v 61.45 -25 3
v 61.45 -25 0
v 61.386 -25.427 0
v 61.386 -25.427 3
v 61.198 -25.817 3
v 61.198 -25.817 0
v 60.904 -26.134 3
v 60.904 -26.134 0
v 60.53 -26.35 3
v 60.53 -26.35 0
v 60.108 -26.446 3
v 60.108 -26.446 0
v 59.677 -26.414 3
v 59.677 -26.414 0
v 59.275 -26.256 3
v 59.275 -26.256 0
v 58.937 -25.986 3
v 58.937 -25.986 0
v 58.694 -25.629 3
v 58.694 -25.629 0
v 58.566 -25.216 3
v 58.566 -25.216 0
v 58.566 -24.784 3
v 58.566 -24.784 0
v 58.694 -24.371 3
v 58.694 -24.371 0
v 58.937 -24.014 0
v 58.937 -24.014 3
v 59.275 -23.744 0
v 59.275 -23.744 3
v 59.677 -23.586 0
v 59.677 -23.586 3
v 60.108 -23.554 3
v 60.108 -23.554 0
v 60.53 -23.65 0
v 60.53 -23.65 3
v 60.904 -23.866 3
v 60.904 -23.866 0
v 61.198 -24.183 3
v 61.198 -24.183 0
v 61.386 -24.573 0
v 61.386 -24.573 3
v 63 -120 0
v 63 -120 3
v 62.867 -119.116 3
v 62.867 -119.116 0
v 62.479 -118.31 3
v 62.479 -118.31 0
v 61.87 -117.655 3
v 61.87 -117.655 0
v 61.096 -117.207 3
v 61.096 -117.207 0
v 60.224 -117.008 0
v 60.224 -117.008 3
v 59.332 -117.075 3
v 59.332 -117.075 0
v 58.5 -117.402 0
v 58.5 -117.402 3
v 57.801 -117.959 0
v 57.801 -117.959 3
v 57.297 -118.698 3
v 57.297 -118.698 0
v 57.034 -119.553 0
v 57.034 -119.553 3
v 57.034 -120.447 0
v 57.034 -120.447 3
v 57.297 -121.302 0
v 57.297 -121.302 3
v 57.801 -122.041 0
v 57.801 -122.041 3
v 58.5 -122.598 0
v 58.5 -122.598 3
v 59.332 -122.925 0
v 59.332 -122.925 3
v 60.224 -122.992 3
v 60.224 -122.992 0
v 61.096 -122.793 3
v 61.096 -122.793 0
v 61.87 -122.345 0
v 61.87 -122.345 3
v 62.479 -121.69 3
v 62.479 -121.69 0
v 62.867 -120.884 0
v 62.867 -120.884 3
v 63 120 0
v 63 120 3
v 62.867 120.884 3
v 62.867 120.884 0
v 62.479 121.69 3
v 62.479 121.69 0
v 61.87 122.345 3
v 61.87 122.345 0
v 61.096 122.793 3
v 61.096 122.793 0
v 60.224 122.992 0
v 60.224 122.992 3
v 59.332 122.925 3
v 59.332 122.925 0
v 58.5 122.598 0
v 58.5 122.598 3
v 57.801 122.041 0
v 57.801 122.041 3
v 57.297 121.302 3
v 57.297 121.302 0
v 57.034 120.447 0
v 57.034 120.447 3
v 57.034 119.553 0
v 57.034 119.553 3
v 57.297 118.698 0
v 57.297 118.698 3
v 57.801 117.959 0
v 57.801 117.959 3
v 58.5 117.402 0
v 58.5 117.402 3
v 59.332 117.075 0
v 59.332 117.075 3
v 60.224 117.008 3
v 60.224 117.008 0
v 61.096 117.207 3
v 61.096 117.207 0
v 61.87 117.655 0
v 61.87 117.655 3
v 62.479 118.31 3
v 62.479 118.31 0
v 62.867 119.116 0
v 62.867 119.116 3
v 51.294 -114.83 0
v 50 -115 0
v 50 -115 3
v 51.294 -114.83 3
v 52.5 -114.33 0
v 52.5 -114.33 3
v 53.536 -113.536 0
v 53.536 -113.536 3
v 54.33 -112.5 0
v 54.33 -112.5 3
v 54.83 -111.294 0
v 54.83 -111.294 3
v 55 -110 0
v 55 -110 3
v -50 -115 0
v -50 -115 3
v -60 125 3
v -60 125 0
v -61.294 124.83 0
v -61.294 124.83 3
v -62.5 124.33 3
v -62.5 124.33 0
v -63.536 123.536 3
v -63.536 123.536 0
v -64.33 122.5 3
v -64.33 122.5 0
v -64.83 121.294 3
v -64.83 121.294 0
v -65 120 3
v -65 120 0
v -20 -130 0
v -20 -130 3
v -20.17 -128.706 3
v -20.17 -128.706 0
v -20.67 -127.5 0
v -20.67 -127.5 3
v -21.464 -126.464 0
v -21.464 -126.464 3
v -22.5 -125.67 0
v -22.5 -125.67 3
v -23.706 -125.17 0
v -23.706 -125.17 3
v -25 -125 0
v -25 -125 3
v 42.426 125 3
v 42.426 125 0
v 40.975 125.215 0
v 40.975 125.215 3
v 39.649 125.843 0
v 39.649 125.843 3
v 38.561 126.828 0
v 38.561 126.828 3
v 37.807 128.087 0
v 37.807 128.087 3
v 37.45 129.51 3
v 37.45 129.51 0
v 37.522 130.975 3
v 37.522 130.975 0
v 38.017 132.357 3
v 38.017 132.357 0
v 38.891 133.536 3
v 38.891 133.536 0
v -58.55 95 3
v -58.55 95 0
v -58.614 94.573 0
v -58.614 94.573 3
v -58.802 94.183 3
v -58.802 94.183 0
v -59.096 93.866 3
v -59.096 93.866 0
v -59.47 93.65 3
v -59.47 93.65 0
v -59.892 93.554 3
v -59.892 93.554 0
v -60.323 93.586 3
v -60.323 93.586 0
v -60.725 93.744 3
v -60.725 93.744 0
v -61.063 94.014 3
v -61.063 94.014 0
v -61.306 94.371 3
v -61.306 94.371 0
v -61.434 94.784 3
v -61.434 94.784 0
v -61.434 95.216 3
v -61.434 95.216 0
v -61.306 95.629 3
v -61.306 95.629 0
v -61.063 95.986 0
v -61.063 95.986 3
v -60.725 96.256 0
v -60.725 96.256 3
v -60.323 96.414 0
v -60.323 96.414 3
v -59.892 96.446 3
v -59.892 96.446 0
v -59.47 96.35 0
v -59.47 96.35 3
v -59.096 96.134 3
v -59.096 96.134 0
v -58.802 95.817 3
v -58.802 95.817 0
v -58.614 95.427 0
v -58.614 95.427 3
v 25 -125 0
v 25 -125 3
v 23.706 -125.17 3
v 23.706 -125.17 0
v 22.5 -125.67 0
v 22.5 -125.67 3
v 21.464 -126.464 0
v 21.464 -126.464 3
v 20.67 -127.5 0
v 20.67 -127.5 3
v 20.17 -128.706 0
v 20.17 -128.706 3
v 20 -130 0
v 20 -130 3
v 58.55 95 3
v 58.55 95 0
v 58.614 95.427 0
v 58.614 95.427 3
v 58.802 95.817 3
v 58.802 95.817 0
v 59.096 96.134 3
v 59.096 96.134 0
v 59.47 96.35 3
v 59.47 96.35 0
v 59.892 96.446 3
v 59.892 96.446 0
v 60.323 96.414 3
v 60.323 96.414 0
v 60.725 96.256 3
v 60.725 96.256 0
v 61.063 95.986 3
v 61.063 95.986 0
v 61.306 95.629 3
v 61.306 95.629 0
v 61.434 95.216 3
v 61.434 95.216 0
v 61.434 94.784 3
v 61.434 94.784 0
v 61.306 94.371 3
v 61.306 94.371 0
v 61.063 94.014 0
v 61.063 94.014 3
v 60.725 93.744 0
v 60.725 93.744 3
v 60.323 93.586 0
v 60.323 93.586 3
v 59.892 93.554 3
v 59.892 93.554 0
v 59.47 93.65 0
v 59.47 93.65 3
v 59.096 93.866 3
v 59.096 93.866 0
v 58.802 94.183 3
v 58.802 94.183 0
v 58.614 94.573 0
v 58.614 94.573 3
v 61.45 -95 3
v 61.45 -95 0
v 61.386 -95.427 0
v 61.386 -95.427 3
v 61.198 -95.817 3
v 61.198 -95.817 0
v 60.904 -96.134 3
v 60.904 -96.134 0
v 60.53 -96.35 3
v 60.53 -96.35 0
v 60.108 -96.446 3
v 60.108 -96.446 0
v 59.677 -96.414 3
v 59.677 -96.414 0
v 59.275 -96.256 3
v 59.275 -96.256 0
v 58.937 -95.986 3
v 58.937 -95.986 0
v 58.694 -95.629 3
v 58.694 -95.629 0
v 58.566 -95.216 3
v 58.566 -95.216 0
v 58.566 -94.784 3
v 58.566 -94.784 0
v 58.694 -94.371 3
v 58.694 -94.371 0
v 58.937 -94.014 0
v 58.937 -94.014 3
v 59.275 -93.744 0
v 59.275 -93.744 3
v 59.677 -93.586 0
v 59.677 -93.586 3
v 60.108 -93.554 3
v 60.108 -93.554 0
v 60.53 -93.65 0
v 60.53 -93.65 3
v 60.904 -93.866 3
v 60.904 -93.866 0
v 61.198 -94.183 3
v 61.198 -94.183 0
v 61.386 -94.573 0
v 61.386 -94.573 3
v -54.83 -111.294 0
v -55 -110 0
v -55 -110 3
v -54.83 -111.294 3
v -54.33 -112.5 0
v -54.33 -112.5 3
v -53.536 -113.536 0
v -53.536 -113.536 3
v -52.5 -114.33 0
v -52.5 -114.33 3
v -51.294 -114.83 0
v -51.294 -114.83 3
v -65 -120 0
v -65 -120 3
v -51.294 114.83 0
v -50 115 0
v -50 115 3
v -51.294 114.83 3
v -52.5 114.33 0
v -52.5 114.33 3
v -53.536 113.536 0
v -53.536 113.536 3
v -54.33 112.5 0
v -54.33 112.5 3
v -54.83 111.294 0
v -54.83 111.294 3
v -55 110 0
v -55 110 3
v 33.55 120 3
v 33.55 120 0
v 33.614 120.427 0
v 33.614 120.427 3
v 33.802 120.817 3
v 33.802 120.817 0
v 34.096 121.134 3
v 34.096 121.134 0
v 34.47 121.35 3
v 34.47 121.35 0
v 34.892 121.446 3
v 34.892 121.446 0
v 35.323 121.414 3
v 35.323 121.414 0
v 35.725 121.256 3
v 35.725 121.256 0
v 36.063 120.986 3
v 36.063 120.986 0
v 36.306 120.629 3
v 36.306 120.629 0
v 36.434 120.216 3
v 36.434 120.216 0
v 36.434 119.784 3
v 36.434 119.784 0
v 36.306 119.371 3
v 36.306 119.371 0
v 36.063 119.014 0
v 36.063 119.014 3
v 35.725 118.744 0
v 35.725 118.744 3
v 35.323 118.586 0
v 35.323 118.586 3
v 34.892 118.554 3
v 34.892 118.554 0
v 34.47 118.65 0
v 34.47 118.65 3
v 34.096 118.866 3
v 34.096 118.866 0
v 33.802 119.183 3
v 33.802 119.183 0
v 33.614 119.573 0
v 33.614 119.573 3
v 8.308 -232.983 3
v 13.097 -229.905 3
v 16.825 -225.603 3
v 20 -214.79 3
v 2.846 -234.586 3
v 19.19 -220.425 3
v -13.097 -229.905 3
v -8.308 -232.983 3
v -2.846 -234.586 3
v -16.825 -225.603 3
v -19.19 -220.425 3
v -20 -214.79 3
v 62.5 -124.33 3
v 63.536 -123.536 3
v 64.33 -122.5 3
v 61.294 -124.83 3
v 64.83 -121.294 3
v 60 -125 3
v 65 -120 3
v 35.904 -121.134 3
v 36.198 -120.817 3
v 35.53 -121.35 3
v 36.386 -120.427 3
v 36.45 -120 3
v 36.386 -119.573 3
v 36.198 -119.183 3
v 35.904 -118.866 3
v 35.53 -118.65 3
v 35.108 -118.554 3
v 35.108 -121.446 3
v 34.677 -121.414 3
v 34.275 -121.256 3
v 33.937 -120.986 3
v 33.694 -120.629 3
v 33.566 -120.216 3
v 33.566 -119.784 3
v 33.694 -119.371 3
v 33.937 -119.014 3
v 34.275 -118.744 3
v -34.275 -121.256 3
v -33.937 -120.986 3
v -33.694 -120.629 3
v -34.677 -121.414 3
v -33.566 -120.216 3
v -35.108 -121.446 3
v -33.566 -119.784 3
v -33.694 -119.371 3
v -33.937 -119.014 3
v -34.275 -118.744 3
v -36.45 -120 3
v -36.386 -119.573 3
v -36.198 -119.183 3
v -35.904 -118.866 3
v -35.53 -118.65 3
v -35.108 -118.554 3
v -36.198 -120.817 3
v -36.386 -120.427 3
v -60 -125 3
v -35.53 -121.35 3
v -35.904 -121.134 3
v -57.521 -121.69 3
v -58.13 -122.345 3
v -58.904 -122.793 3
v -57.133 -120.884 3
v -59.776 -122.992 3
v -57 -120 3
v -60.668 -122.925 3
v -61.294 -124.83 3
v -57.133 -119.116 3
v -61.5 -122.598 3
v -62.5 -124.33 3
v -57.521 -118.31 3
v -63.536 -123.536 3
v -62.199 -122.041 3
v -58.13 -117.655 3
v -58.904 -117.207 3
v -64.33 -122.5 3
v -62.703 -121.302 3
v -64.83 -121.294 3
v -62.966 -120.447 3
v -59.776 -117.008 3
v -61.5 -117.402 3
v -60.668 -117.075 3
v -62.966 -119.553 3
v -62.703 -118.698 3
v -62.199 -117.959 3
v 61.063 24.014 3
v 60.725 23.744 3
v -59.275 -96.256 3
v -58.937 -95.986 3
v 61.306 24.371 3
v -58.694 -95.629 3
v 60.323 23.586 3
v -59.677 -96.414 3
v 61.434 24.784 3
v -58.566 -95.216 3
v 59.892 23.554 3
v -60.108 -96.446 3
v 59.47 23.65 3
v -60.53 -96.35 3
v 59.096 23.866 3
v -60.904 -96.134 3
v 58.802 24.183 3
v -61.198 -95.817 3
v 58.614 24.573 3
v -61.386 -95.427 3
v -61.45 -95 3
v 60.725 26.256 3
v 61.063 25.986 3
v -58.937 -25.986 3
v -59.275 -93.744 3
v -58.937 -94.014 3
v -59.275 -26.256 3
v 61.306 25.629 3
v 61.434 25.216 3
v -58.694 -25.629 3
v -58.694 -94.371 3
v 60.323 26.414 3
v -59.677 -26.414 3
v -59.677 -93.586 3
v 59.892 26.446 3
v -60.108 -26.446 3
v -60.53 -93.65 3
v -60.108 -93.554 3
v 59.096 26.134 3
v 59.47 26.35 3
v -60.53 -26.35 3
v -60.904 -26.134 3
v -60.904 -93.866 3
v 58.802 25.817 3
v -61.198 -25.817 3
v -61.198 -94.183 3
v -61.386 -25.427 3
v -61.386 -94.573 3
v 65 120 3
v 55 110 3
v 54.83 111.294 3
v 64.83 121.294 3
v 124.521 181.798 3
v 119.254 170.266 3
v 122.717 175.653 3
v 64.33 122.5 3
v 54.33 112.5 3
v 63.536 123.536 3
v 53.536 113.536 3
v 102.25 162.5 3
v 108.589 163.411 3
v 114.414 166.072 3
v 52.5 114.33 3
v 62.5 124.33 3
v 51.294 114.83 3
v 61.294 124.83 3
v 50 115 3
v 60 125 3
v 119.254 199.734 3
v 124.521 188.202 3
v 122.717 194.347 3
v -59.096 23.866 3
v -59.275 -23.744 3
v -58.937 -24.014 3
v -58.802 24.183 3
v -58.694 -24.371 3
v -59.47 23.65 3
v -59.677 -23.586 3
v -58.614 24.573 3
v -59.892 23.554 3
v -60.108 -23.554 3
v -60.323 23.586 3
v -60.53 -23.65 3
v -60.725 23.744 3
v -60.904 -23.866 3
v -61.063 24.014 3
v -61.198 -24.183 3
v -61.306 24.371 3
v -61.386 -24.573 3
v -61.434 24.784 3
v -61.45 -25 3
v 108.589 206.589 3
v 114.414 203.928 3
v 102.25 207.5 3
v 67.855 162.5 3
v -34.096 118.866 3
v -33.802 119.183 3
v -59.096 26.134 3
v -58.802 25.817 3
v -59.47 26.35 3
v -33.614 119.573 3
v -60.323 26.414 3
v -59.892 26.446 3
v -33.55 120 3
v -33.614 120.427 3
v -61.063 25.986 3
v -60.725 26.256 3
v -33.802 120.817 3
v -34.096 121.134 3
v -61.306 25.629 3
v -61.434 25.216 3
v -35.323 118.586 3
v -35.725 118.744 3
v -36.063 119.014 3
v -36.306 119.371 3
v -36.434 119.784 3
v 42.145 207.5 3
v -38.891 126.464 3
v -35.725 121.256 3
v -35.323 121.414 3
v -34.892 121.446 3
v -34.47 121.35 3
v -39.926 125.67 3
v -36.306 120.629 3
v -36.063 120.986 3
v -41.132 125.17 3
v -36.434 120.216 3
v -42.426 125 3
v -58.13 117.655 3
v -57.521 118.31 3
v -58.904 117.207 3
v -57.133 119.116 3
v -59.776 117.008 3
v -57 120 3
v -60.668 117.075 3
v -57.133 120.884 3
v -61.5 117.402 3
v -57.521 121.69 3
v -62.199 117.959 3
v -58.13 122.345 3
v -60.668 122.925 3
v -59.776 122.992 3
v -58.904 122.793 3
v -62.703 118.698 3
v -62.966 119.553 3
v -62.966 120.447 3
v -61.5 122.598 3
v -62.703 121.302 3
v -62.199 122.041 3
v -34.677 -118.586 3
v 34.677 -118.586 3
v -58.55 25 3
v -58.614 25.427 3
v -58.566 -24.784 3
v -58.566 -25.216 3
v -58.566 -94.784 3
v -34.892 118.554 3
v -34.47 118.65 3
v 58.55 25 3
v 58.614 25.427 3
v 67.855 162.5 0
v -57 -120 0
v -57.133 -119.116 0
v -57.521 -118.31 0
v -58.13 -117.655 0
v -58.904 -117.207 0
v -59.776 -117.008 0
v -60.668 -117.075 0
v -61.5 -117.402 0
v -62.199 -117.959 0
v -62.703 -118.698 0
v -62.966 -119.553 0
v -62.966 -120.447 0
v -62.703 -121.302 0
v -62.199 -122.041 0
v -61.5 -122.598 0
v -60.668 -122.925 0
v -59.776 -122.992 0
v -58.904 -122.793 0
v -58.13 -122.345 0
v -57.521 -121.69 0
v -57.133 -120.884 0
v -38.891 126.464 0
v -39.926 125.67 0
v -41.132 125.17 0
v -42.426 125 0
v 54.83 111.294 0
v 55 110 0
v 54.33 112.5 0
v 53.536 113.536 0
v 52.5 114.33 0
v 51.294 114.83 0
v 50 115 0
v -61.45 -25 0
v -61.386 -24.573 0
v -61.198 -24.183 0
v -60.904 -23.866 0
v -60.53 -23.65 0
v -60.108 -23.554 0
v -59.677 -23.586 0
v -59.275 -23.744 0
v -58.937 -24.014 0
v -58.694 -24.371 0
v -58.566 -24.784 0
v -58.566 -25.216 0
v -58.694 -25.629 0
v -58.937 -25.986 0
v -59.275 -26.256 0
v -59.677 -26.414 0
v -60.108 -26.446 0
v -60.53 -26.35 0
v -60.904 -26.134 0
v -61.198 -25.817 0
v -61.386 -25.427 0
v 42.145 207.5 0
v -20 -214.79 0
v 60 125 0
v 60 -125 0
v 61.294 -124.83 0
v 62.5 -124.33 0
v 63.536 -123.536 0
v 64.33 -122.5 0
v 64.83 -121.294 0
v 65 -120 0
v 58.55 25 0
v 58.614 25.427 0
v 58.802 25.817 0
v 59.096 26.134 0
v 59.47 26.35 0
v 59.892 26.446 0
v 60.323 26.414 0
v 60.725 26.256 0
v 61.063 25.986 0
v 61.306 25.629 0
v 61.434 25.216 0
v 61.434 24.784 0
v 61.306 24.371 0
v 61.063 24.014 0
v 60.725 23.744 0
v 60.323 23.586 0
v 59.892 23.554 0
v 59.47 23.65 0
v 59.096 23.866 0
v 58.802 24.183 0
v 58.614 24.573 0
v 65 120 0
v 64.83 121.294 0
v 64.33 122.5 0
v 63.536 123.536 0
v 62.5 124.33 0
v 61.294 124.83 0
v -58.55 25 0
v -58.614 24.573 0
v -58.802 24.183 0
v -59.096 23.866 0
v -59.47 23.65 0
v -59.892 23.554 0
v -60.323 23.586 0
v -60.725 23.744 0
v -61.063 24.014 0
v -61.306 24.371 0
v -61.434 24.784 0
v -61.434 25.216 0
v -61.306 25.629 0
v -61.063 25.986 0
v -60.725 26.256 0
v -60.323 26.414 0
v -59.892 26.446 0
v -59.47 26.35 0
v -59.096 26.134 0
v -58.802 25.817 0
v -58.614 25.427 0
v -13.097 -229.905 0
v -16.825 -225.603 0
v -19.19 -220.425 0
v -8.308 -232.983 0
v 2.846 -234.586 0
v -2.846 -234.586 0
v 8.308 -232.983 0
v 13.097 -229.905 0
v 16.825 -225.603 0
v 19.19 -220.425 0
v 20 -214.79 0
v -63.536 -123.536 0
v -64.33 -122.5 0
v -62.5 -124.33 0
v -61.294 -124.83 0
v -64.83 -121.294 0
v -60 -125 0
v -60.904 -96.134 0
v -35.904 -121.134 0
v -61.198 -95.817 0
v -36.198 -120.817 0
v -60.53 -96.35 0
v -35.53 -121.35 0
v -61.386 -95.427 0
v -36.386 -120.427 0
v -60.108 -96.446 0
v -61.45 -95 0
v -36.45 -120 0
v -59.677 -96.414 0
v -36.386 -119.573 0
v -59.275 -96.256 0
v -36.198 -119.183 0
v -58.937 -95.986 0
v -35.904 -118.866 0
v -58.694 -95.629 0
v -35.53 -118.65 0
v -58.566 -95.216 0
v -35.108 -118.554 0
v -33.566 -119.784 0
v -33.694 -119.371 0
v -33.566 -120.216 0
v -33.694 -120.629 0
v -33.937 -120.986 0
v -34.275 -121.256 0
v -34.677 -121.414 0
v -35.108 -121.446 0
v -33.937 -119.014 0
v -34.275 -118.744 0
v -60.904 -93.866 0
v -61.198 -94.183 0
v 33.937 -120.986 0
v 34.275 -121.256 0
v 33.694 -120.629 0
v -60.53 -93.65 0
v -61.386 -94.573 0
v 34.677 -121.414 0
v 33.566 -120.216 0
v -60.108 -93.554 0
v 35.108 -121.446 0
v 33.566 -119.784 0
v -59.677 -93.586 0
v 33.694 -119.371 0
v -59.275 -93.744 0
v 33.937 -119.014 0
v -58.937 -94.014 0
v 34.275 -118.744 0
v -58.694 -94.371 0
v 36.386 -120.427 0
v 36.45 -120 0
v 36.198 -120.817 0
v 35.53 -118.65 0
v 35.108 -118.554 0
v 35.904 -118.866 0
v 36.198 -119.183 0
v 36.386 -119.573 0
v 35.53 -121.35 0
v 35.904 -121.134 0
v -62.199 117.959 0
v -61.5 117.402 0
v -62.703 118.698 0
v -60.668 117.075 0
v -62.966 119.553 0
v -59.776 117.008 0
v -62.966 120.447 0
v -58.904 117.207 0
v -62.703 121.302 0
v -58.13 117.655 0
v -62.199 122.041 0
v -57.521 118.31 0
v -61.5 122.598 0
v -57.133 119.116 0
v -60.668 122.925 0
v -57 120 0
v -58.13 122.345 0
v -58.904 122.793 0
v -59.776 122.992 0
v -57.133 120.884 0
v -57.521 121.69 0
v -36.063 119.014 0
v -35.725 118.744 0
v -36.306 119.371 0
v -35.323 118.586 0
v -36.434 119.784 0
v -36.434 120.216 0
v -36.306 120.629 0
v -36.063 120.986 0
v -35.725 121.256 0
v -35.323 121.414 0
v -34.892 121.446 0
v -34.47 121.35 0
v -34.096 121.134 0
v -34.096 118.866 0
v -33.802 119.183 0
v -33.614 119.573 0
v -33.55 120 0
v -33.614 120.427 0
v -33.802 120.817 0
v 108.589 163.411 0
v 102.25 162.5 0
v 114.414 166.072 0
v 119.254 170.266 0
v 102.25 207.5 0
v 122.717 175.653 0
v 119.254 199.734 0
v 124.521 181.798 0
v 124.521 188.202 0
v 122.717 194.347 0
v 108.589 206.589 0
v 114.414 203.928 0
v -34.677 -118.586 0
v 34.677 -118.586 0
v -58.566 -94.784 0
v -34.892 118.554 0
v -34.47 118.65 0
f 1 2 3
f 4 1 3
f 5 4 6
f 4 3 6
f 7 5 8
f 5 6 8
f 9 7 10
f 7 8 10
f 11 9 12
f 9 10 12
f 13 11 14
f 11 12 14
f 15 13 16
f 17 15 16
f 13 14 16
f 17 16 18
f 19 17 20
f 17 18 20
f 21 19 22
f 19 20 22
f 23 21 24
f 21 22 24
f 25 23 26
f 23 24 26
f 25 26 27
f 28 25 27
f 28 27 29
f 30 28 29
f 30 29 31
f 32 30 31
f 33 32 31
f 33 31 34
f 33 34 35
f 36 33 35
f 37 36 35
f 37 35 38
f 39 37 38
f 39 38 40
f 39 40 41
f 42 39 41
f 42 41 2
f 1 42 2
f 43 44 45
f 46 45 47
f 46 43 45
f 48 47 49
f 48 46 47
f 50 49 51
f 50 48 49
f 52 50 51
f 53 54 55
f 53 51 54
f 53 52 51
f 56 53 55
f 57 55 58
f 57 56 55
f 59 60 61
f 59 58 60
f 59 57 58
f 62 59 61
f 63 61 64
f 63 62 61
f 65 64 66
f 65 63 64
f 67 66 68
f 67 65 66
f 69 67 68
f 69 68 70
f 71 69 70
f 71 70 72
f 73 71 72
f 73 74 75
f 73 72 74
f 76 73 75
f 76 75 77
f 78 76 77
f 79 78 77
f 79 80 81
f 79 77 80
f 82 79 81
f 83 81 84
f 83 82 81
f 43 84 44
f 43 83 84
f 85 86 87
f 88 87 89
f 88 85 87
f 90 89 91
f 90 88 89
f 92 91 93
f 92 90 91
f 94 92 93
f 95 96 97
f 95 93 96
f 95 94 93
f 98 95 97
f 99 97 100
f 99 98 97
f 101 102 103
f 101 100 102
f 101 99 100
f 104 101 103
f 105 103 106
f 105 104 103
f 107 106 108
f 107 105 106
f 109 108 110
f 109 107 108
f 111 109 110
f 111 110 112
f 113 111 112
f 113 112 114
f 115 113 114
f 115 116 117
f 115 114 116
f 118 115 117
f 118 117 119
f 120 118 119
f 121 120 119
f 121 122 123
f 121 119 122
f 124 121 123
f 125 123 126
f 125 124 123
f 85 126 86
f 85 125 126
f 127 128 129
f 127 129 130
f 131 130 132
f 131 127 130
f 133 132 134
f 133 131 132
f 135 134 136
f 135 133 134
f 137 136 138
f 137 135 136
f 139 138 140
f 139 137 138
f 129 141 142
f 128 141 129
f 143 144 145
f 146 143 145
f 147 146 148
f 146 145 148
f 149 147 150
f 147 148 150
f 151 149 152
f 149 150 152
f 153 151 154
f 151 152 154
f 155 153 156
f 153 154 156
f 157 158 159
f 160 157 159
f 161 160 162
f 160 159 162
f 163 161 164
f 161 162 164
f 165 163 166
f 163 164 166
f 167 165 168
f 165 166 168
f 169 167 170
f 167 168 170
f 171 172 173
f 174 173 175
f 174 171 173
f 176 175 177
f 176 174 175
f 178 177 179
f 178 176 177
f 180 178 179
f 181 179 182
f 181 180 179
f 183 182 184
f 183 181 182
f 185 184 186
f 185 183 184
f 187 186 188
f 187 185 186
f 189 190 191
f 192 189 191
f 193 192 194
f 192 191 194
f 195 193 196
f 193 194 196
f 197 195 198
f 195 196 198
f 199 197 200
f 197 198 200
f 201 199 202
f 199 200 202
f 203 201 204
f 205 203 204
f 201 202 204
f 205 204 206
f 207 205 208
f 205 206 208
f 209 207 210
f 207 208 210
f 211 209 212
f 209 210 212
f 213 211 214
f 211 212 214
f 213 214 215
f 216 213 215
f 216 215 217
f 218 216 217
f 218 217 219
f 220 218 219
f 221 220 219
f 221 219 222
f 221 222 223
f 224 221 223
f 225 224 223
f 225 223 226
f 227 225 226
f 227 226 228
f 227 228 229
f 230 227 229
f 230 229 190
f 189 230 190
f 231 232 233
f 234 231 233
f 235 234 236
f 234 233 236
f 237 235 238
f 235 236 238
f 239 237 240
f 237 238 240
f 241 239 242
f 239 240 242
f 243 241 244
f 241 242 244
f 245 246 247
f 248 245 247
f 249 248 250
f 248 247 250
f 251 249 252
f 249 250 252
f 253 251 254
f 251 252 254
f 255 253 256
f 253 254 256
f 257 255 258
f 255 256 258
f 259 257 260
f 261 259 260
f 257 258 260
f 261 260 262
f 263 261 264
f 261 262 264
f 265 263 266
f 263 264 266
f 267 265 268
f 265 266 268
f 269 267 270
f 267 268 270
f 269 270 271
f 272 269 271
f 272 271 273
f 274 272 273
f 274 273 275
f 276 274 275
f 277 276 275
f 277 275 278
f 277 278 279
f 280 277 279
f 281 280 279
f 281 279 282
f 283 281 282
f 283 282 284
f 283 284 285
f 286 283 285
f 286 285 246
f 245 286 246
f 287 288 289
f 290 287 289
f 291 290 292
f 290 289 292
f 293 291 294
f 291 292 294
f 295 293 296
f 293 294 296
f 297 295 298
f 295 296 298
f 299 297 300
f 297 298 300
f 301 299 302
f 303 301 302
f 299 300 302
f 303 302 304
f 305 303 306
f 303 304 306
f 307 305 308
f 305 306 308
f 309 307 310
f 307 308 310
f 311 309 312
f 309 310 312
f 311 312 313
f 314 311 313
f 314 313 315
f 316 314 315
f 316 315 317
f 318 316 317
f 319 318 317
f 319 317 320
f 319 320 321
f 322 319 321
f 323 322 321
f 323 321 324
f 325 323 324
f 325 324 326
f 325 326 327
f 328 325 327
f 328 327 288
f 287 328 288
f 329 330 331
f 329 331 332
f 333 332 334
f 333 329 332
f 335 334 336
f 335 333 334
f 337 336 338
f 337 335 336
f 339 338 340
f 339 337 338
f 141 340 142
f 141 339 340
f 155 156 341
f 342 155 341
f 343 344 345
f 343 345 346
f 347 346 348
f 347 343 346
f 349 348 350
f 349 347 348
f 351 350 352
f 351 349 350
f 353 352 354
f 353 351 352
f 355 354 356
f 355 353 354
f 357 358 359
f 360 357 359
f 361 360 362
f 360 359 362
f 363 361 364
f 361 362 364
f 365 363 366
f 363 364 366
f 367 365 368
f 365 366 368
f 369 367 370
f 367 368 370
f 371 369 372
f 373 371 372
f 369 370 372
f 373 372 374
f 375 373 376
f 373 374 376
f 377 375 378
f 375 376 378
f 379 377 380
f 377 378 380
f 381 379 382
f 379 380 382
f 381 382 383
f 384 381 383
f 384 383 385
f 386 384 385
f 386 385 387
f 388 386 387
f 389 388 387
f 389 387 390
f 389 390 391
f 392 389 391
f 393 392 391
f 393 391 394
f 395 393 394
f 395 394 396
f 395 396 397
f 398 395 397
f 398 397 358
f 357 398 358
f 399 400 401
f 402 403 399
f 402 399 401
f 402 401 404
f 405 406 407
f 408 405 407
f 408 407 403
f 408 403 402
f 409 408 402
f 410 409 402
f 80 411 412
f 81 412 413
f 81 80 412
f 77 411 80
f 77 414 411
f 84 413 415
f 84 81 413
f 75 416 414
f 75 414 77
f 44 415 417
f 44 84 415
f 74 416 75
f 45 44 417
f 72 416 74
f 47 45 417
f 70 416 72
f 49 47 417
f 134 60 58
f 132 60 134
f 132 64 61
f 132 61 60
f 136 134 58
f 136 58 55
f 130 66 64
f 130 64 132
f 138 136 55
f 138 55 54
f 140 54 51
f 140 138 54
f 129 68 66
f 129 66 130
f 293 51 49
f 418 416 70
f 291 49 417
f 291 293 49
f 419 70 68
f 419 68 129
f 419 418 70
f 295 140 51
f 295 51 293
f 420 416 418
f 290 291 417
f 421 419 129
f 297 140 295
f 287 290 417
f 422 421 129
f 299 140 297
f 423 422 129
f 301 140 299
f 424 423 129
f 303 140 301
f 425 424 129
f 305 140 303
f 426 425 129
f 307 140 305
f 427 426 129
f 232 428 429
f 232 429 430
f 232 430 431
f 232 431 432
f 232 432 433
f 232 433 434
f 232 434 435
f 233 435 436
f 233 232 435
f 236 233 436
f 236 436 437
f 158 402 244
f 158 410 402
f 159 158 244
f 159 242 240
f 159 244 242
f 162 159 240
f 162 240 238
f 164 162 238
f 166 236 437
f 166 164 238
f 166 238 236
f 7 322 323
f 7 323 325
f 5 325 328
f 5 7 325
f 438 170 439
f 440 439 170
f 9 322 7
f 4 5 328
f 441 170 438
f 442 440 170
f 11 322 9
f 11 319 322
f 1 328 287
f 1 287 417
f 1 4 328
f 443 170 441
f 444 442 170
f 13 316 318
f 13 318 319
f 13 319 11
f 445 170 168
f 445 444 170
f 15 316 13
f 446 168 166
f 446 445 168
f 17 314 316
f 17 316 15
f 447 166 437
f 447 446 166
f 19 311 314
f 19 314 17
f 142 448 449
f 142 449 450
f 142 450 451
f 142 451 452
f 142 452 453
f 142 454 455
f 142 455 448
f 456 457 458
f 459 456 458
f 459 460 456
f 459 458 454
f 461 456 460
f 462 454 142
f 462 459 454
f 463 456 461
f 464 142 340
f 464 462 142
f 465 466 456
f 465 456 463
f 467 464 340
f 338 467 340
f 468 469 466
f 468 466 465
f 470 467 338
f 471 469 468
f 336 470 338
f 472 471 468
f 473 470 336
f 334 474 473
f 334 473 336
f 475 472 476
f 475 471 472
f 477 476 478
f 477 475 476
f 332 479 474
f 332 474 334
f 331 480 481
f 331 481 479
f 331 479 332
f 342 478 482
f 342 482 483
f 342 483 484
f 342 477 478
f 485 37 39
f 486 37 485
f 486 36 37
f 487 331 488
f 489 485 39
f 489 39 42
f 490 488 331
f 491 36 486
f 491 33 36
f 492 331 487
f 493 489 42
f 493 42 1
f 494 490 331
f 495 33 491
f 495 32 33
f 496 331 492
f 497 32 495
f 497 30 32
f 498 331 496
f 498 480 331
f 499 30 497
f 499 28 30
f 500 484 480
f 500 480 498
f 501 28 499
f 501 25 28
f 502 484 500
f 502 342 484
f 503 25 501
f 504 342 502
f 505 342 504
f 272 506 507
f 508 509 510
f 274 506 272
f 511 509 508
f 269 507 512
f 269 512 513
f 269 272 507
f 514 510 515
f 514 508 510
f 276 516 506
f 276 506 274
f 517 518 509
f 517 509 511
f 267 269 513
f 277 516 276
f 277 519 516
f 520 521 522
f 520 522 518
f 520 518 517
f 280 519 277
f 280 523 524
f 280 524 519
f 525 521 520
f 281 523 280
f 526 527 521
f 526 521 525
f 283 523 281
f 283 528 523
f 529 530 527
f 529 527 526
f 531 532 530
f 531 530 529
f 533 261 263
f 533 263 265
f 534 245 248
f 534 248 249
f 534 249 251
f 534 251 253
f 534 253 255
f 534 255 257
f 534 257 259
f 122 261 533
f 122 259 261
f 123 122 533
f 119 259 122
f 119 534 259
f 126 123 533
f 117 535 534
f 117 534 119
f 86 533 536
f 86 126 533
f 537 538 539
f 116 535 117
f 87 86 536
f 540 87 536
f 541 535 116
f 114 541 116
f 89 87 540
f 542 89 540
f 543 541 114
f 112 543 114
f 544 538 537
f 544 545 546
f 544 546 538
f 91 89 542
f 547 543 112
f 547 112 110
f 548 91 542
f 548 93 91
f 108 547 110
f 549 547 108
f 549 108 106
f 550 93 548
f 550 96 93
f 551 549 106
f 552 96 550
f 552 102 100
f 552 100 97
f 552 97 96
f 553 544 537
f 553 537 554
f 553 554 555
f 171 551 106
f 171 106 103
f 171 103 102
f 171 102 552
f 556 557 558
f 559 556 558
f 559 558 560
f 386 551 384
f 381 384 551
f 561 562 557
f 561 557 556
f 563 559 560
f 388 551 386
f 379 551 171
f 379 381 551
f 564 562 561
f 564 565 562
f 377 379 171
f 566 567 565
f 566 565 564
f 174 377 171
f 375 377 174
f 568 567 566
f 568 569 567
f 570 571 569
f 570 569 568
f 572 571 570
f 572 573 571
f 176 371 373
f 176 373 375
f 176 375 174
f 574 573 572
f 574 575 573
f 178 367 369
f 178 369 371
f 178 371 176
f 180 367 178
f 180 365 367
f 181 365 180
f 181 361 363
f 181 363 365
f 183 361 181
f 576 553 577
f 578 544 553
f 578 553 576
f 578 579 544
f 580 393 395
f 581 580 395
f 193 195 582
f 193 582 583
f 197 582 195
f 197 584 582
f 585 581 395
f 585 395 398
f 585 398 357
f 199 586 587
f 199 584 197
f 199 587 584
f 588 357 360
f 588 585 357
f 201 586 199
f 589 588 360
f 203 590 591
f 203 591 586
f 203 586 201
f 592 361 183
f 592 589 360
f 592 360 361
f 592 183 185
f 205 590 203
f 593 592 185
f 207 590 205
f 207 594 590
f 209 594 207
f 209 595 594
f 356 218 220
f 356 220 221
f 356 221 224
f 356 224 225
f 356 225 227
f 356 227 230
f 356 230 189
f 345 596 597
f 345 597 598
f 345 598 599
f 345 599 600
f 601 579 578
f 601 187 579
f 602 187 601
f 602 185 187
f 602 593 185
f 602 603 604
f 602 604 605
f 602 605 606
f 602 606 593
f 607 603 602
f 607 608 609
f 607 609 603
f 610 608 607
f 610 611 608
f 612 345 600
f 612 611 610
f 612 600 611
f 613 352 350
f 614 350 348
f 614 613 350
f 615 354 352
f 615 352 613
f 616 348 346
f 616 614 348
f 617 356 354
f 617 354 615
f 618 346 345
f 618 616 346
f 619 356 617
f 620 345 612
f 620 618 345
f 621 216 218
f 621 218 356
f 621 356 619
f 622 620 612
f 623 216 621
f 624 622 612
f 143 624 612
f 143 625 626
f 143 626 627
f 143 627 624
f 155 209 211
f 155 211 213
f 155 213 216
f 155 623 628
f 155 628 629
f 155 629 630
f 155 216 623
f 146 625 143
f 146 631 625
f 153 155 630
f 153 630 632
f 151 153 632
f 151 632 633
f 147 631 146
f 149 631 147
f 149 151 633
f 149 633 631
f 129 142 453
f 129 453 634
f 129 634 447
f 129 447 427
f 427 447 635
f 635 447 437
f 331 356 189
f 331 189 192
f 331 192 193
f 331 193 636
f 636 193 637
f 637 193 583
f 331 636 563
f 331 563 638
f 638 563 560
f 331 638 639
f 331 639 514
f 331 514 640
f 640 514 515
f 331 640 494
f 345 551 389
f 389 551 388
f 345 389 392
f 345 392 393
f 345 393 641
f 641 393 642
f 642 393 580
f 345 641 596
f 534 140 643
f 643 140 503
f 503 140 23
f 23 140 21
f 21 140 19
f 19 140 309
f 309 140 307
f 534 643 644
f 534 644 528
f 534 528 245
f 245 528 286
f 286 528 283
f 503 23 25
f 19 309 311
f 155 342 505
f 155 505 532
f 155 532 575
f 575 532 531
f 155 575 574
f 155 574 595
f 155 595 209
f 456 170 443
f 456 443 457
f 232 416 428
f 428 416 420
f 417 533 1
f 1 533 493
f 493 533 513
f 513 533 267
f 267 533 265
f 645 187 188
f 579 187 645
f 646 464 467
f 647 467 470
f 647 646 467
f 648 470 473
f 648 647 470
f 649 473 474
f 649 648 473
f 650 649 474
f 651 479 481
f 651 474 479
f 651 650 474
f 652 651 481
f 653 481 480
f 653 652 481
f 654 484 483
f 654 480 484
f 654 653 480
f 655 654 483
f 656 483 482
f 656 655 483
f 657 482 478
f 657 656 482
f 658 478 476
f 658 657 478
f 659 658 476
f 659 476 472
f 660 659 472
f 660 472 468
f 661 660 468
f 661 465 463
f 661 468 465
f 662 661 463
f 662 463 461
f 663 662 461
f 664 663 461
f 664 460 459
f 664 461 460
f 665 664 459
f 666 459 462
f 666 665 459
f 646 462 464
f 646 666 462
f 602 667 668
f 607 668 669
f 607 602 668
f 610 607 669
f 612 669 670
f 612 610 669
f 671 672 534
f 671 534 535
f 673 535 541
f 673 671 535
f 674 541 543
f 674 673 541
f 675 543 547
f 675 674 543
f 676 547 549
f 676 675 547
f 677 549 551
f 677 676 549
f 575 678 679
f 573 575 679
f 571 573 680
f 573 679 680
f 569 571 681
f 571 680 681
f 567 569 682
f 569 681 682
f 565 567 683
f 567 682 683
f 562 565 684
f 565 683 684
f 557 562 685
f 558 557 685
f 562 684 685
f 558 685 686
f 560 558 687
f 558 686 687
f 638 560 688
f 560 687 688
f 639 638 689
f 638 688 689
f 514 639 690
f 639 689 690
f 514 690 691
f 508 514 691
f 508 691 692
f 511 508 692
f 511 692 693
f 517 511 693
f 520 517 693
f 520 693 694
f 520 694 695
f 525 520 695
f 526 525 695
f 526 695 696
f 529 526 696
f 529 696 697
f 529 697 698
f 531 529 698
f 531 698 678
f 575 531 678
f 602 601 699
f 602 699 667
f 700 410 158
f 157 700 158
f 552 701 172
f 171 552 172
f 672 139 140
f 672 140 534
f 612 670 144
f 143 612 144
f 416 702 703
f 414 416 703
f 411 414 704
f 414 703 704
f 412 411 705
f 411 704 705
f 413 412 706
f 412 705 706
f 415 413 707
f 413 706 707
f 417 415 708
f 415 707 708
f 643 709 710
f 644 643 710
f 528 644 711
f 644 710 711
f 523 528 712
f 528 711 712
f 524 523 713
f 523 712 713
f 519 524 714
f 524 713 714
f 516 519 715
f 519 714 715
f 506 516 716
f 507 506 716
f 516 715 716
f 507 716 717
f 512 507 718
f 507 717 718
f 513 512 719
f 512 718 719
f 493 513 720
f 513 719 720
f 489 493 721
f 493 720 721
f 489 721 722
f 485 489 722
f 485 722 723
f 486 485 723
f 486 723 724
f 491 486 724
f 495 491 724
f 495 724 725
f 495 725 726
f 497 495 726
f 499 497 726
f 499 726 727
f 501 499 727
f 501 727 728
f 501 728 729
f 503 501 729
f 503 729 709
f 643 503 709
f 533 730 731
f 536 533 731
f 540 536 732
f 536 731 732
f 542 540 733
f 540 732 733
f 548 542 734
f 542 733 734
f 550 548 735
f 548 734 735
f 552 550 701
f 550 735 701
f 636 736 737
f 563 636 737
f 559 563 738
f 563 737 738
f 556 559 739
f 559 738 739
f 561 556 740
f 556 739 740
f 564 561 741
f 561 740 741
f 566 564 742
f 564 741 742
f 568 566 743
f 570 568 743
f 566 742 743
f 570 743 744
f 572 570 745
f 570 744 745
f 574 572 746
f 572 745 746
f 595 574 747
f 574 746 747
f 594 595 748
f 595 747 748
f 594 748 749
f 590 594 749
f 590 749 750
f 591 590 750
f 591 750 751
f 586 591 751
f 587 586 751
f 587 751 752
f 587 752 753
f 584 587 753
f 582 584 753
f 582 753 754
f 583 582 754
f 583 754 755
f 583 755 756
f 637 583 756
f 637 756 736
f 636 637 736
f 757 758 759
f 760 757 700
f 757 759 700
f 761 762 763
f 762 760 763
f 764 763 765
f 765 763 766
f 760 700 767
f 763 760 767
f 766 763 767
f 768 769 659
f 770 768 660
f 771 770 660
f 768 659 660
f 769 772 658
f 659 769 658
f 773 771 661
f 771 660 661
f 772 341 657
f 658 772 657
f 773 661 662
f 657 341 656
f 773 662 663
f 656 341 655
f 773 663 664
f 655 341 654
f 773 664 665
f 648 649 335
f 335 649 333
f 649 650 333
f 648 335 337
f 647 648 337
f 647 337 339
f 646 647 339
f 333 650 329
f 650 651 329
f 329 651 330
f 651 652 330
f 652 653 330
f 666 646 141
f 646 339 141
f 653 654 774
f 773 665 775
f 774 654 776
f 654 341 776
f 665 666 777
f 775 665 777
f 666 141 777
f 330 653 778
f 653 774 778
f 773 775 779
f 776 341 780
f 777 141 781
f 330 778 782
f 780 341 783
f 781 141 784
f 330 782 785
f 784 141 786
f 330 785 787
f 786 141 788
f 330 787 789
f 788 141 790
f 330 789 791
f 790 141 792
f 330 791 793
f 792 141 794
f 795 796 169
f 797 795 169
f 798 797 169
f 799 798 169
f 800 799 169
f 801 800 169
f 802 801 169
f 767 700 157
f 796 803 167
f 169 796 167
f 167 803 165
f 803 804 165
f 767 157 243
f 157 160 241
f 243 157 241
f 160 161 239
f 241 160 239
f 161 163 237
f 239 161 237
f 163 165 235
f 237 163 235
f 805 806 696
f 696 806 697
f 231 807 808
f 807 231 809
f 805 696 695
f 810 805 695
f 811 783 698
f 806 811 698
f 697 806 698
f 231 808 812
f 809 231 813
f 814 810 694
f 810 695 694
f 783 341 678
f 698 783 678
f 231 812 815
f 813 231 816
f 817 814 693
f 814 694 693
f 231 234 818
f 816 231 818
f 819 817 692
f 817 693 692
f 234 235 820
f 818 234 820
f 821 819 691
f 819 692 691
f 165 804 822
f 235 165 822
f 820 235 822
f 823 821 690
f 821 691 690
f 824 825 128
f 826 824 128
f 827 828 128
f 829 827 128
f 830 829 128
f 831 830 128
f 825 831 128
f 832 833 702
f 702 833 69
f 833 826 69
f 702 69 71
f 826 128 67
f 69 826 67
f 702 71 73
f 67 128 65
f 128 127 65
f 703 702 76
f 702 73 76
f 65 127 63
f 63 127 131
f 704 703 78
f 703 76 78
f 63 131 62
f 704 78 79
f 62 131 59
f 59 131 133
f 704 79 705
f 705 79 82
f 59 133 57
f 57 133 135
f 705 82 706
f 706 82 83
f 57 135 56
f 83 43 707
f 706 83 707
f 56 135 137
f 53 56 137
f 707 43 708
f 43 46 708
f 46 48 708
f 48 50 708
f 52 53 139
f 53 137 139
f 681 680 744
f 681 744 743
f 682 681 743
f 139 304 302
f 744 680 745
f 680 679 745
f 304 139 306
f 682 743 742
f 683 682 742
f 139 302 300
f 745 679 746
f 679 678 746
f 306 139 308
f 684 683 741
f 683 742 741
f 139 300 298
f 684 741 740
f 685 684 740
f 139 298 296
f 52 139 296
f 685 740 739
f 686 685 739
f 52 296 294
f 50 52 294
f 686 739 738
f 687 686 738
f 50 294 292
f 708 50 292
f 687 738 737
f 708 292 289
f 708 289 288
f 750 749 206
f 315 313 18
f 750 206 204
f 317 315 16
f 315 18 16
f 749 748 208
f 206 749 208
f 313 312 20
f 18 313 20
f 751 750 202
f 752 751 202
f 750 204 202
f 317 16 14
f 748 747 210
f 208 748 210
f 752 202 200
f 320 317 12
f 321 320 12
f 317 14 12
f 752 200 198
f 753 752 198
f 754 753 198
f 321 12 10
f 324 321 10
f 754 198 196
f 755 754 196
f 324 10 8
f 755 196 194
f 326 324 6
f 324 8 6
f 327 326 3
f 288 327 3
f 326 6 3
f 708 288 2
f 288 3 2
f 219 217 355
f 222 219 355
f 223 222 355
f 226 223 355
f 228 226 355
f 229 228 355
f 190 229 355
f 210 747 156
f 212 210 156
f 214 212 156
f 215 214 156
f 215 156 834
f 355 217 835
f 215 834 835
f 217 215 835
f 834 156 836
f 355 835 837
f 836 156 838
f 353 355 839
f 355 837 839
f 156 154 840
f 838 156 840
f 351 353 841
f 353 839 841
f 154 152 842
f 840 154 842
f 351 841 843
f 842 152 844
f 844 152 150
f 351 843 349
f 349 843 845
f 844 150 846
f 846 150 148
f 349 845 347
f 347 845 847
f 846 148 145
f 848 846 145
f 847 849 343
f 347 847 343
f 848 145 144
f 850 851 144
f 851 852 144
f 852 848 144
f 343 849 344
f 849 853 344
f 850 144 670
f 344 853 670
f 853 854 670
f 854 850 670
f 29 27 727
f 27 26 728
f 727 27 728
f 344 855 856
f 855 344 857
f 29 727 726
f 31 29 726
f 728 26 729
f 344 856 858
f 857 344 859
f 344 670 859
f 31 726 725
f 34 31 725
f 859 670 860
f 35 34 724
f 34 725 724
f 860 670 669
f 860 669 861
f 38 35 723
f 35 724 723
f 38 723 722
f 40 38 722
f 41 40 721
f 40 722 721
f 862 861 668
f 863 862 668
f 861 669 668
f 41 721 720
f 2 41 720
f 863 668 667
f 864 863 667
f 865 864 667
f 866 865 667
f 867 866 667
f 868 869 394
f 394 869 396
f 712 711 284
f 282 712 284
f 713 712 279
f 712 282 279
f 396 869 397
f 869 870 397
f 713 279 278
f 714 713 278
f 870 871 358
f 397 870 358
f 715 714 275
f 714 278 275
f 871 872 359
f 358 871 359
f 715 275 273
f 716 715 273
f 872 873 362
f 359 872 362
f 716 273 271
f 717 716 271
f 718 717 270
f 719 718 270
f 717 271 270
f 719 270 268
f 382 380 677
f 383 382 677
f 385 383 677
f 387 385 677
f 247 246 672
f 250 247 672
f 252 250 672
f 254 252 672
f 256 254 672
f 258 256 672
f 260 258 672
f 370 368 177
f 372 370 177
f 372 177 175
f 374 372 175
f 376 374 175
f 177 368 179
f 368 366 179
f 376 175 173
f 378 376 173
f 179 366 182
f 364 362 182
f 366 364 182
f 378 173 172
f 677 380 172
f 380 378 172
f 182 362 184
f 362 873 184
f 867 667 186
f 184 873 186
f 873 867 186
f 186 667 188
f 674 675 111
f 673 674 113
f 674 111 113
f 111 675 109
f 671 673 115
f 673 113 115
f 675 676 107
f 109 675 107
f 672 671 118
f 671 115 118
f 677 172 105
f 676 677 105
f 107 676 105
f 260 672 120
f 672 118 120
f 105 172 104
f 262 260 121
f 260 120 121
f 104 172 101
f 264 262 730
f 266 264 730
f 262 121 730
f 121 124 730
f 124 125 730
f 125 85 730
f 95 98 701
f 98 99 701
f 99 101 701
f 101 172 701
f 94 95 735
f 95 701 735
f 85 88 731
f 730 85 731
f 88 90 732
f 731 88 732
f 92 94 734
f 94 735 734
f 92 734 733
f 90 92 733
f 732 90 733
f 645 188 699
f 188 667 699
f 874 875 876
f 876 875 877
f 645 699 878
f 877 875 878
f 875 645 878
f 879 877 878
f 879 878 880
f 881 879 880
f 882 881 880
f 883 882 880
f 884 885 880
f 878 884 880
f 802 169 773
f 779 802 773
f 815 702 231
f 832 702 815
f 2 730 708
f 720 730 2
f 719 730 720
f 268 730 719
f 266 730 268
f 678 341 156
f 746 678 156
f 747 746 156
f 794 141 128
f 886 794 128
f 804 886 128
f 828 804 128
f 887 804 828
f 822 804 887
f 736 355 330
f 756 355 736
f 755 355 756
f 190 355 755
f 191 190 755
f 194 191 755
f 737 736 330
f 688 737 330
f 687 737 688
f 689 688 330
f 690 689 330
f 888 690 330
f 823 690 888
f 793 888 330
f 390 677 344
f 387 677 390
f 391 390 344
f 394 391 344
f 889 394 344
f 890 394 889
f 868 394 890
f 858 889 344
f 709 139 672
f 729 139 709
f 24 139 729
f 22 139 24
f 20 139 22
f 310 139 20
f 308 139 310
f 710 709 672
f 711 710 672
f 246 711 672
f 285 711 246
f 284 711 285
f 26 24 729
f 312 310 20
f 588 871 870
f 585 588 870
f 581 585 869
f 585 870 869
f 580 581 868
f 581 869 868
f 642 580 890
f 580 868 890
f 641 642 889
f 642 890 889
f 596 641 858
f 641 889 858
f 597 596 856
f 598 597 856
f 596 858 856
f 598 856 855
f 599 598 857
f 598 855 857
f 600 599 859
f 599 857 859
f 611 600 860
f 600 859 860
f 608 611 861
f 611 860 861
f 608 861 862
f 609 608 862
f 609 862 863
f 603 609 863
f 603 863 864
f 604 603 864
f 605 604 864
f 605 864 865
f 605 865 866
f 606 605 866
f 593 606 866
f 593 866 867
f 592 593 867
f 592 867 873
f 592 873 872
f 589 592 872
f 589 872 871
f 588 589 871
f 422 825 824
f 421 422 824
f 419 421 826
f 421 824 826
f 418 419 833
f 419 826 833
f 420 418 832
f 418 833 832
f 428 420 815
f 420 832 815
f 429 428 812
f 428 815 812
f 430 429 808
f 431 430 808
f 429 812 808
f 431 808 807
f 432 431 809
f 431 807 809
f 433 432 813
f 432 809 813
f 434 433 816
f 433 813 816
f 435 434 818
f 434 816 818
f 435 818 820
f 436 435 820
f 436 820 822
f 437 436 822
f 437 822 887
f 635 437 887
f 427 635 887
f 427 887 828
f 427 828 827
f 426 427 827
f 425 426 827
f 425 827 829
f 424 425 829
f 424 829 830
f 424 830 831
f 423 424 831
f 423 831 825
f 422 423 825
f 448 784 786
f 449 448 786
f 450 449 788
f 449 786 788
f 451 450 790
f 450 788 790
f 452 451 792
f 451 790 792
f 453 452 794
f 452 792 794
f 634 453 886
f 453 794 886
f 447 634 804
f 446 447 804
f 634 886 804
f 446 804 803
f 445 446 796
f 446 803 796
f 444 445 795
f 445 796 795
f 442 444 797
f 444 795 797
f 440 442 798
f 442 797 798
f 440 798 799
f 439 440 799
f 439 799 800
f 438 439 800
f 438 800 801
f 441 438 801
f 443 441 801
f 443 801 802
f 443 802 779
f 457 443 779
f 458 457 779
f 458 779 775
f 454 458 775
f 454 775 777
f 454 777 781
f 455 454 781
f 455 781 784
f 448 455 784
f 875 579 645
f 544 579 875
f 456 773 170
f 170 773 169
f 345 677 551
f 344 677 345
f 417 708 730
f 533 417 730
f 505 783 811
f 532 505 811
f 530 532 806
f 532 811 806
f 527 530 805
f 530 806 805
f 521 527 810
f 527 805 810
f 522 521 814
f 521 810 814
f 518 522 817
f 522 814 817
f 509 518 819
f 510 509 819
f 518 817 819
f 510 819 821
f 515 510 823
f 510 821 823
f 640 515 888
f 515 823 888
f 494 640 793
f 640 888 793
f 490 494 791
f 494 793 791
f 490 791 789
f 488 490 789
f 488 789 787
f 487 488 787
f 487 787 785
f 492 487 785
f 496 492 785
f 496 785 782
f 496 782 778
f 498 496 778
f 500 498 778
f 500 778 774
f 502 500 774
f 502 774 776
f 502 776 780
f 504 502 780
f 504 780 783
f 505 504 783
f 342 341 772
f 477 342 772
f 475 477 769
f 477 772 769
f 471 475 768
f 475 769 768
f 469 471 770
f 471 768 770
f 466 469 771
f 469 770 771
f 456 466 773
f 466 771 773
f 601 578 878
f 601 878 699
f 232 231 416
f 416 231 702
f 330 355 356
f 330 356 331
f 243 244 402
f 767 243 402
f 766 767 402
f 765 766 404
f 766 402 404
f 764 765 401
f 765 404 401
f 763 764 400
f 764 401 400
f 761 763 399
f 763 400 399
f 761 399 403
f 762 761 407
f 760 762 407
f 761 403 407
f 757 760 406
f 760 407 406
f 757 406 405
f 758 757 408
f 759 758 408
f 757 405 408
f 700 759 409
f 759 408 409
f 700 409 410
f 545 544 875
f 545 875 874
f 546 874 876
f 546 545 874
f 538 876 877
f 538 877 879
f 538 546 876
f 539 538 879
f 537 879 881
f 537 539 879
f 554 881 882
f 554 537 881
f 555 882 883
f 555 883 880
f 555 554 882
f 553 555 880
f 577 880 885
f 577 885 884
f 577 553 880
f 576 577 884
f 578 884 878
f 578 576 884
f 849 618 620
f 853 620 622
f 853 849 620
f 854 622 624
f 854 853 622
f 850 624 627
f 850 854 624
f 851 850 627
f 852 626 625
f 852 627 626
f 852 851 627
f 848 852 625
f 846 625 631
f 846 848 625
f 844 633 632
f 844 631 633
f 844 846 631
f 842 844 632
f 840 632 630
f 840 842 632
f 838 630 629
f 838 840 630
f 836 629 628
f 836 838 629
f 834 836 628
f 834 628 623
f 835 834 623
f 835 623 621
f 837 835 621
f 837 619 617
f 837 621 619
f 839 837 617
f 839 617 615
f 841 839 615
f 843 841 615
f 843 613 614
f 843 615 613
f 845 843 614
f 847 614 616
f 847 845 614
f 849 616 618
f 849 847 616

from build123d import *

# Parameters (mm, degrees)
SKETCH1_R           = 3
BOSS_EXTRUDE1_DEPTH = 10
SKETCH2_R           = 1.45
CUT_EXTRUDE1_DEPTH  = 142.244468918
BOSS_EXTRUDE2_DEPTH = 10
BOSS_EXTRUDE3_DEPTH = 10
SKETCH8_W           = 62.731065403
SKETCH8_H           = 467.056503757
CUT_EXTRUDE5_DEPTH  = 303.045371757


with BuildPart() as part:
    # Sketch1 → Boss-Extrude1 (new body)
    with BuildSketch(Plane.XY):
        with BuildLine():
            Line((-60, -125), (60, -125))
            ThreePointArc((60, -125), (63.535533906, -123.535533906), (65, -120))
            Line((65, -120), (65, 120))
            ThreePointArc((65, 120), (63.535533906, 123.535533906), (60, 125))
            Line((60, 125), (-60, 125))
            ThreePointArc((-60, 125), (-63.535533906, 123.535533906), (-65, 120))
            Line((-65, 120), (-65, -120))
            ThreePointArc((-65, -120), (-63.535533906, -123.535533906), (-60, -125))
        make_face()
        with Locations((-60, 120)):
            Circle(SKETCH1_R, mode=Mode.SUBTRACT)
        with Locations((60, 120)):
            Circle(SKETCH1_R, mode=Mode.SUBTRACT)
        with Locations((-60, -120)):
            Circle(SKETCH1_R, mode=Mode.SUBTRACT)
        with Locations((60, -120)):
            Circle(SKETCH1_R, mode=Mode.SUBTRACT)
        with BuildLine():
            Line((-50, -115), (50, -115))
            ThreePointArc((50, -115), (53.535533906, -113.535533906), (55, -110))
            Line((55, -110), (55, 110))
            ThreePointArc((55, 110), (53.535533906, 113.535533906), (50, 115))
            Line((50, 115), (-50, 115))
            ThreePointArc((-50, 115), (-53.535533906, 113.535533906), (-55, 110))
            Line((-55, 110), (-55, -110))
            ThreePointArc((-55, -110), (-53.535533906, -113.535533906), (-50, -115))
        make_face(mode=Mode.SUBTRACT)
    extrude(amount=BOSS_EXTRUDE1_DEPTH)

    # Sketch2 → Cut-Extrude1 (cut, through all)
    with BuildSketch(Plane(origin=(0, 0, 0), x_dir=(-1, 0, 0), z_dir=(0, 0, -1))):
        with Locations((-35, 120)):
            Circle(SKETCH2_R)
        with Locations((-60, 95)):
            Circle(SKETCH2_R)
        with Locations((-60, 25)):
            Circle(SKETCH2_R)
        with Locations(Location((-60, -25, 0), (0, 0, 180))):
            Circle(SKETCH2_R)
        with Locations(Location((-60, -95, 0), (0, 0, 180))):
            Circle(SKETCH2_R)
        with Locations(Location((-35, -120, 0), (0, 0, 180))):
            Circle(SKETCH2_R)
        with Locations((35, -120)):
            Circle(SKETCH2_R)
        with Locations((60, -95)):
            Circle(SKETCH2_R)
        with Locations((60, -25)):
            Circle(SKETCH2_R)
        with Locations(Location((60, 25, 0), (0, 0, 180))):
            Circle(SKETCH2_R)
        with Locations(Location((60, 95, 0), (0, 0, 180))):
            Circle(SKETCH2_R)
        with Locations(Location((35, 120, 0), (0, 0, 180))):
            Circle(SKETCH2_R)
    extrude(amount=-CUT_EXTRUDE1_DEPTH, mode=Mode.SUBTRACT)

    # Sketch3 → Boss-Extrude2 (add, through all)
    with BuildSketch(Plane.XY.offset(10)):
        with BuildLine():
            Line((-20, -214.79), (-20, -130))
            ThreePointArc((-20, -130), (-21.464466094, -126.464466094), (-25, -125))
            Line((-25, -125), (25, -125))
            ThreePointArc((25, -125), (21.464466094, -126.464466094), (20, -130))
            Line((20, -130), (20, -214.79))
            ThreePointArc((20, -214.79), (0, -234.79), (-20, -214.79))
        make_face()
    extrude(amount=-BOSS_EXTRUDE2_DEPTH)

    # Sketch5 → Boss-Extrude3 (add)
    with BuildSketch(Plane.XY.offset(10)):
        with BuildLine():
            ThreePointArc((-38.890872965, 126.464466094), (-40.512989709, 125.380602337), (-42.426406871, 125))
            Line((-42.426406871, 125), (42.426406871, 125))
            ThreePointArc((42.426406871, 125), (37.807009209, 128.086582838), (38.890872965, 133.535533906))
            Line((38.890872965, 133.535533906), (67.855339059, 162.5))
            Line((67.855339059, 162.5), (102.25, 162.5))
            ThreePointArc((102.25, 162.5), (124.75, 185), (102.25, 207.5))
            Line((102.25, 207.5), (42.144660941, 207.5))
            Line((42.144660941, 207.5), (-38.890872965, 126.464466094))
        make_face()
    extrude(amount=-BOSS_EXTRUDE3_DEPTH)

    # Sketch8 → Cut-Extrude5 (cut, through all)
    with BuildSketch(Plane.ZY.offset(65)):
        with Locations((34.365532702, -16.017183146)):
            Rectangle(SKETCH8_W, SKETCH8_H)
    extrude(amount=-CUT_EXTRUDE5_DEPTH, mode=Mode.SUBTRACT)


solid = part.part
